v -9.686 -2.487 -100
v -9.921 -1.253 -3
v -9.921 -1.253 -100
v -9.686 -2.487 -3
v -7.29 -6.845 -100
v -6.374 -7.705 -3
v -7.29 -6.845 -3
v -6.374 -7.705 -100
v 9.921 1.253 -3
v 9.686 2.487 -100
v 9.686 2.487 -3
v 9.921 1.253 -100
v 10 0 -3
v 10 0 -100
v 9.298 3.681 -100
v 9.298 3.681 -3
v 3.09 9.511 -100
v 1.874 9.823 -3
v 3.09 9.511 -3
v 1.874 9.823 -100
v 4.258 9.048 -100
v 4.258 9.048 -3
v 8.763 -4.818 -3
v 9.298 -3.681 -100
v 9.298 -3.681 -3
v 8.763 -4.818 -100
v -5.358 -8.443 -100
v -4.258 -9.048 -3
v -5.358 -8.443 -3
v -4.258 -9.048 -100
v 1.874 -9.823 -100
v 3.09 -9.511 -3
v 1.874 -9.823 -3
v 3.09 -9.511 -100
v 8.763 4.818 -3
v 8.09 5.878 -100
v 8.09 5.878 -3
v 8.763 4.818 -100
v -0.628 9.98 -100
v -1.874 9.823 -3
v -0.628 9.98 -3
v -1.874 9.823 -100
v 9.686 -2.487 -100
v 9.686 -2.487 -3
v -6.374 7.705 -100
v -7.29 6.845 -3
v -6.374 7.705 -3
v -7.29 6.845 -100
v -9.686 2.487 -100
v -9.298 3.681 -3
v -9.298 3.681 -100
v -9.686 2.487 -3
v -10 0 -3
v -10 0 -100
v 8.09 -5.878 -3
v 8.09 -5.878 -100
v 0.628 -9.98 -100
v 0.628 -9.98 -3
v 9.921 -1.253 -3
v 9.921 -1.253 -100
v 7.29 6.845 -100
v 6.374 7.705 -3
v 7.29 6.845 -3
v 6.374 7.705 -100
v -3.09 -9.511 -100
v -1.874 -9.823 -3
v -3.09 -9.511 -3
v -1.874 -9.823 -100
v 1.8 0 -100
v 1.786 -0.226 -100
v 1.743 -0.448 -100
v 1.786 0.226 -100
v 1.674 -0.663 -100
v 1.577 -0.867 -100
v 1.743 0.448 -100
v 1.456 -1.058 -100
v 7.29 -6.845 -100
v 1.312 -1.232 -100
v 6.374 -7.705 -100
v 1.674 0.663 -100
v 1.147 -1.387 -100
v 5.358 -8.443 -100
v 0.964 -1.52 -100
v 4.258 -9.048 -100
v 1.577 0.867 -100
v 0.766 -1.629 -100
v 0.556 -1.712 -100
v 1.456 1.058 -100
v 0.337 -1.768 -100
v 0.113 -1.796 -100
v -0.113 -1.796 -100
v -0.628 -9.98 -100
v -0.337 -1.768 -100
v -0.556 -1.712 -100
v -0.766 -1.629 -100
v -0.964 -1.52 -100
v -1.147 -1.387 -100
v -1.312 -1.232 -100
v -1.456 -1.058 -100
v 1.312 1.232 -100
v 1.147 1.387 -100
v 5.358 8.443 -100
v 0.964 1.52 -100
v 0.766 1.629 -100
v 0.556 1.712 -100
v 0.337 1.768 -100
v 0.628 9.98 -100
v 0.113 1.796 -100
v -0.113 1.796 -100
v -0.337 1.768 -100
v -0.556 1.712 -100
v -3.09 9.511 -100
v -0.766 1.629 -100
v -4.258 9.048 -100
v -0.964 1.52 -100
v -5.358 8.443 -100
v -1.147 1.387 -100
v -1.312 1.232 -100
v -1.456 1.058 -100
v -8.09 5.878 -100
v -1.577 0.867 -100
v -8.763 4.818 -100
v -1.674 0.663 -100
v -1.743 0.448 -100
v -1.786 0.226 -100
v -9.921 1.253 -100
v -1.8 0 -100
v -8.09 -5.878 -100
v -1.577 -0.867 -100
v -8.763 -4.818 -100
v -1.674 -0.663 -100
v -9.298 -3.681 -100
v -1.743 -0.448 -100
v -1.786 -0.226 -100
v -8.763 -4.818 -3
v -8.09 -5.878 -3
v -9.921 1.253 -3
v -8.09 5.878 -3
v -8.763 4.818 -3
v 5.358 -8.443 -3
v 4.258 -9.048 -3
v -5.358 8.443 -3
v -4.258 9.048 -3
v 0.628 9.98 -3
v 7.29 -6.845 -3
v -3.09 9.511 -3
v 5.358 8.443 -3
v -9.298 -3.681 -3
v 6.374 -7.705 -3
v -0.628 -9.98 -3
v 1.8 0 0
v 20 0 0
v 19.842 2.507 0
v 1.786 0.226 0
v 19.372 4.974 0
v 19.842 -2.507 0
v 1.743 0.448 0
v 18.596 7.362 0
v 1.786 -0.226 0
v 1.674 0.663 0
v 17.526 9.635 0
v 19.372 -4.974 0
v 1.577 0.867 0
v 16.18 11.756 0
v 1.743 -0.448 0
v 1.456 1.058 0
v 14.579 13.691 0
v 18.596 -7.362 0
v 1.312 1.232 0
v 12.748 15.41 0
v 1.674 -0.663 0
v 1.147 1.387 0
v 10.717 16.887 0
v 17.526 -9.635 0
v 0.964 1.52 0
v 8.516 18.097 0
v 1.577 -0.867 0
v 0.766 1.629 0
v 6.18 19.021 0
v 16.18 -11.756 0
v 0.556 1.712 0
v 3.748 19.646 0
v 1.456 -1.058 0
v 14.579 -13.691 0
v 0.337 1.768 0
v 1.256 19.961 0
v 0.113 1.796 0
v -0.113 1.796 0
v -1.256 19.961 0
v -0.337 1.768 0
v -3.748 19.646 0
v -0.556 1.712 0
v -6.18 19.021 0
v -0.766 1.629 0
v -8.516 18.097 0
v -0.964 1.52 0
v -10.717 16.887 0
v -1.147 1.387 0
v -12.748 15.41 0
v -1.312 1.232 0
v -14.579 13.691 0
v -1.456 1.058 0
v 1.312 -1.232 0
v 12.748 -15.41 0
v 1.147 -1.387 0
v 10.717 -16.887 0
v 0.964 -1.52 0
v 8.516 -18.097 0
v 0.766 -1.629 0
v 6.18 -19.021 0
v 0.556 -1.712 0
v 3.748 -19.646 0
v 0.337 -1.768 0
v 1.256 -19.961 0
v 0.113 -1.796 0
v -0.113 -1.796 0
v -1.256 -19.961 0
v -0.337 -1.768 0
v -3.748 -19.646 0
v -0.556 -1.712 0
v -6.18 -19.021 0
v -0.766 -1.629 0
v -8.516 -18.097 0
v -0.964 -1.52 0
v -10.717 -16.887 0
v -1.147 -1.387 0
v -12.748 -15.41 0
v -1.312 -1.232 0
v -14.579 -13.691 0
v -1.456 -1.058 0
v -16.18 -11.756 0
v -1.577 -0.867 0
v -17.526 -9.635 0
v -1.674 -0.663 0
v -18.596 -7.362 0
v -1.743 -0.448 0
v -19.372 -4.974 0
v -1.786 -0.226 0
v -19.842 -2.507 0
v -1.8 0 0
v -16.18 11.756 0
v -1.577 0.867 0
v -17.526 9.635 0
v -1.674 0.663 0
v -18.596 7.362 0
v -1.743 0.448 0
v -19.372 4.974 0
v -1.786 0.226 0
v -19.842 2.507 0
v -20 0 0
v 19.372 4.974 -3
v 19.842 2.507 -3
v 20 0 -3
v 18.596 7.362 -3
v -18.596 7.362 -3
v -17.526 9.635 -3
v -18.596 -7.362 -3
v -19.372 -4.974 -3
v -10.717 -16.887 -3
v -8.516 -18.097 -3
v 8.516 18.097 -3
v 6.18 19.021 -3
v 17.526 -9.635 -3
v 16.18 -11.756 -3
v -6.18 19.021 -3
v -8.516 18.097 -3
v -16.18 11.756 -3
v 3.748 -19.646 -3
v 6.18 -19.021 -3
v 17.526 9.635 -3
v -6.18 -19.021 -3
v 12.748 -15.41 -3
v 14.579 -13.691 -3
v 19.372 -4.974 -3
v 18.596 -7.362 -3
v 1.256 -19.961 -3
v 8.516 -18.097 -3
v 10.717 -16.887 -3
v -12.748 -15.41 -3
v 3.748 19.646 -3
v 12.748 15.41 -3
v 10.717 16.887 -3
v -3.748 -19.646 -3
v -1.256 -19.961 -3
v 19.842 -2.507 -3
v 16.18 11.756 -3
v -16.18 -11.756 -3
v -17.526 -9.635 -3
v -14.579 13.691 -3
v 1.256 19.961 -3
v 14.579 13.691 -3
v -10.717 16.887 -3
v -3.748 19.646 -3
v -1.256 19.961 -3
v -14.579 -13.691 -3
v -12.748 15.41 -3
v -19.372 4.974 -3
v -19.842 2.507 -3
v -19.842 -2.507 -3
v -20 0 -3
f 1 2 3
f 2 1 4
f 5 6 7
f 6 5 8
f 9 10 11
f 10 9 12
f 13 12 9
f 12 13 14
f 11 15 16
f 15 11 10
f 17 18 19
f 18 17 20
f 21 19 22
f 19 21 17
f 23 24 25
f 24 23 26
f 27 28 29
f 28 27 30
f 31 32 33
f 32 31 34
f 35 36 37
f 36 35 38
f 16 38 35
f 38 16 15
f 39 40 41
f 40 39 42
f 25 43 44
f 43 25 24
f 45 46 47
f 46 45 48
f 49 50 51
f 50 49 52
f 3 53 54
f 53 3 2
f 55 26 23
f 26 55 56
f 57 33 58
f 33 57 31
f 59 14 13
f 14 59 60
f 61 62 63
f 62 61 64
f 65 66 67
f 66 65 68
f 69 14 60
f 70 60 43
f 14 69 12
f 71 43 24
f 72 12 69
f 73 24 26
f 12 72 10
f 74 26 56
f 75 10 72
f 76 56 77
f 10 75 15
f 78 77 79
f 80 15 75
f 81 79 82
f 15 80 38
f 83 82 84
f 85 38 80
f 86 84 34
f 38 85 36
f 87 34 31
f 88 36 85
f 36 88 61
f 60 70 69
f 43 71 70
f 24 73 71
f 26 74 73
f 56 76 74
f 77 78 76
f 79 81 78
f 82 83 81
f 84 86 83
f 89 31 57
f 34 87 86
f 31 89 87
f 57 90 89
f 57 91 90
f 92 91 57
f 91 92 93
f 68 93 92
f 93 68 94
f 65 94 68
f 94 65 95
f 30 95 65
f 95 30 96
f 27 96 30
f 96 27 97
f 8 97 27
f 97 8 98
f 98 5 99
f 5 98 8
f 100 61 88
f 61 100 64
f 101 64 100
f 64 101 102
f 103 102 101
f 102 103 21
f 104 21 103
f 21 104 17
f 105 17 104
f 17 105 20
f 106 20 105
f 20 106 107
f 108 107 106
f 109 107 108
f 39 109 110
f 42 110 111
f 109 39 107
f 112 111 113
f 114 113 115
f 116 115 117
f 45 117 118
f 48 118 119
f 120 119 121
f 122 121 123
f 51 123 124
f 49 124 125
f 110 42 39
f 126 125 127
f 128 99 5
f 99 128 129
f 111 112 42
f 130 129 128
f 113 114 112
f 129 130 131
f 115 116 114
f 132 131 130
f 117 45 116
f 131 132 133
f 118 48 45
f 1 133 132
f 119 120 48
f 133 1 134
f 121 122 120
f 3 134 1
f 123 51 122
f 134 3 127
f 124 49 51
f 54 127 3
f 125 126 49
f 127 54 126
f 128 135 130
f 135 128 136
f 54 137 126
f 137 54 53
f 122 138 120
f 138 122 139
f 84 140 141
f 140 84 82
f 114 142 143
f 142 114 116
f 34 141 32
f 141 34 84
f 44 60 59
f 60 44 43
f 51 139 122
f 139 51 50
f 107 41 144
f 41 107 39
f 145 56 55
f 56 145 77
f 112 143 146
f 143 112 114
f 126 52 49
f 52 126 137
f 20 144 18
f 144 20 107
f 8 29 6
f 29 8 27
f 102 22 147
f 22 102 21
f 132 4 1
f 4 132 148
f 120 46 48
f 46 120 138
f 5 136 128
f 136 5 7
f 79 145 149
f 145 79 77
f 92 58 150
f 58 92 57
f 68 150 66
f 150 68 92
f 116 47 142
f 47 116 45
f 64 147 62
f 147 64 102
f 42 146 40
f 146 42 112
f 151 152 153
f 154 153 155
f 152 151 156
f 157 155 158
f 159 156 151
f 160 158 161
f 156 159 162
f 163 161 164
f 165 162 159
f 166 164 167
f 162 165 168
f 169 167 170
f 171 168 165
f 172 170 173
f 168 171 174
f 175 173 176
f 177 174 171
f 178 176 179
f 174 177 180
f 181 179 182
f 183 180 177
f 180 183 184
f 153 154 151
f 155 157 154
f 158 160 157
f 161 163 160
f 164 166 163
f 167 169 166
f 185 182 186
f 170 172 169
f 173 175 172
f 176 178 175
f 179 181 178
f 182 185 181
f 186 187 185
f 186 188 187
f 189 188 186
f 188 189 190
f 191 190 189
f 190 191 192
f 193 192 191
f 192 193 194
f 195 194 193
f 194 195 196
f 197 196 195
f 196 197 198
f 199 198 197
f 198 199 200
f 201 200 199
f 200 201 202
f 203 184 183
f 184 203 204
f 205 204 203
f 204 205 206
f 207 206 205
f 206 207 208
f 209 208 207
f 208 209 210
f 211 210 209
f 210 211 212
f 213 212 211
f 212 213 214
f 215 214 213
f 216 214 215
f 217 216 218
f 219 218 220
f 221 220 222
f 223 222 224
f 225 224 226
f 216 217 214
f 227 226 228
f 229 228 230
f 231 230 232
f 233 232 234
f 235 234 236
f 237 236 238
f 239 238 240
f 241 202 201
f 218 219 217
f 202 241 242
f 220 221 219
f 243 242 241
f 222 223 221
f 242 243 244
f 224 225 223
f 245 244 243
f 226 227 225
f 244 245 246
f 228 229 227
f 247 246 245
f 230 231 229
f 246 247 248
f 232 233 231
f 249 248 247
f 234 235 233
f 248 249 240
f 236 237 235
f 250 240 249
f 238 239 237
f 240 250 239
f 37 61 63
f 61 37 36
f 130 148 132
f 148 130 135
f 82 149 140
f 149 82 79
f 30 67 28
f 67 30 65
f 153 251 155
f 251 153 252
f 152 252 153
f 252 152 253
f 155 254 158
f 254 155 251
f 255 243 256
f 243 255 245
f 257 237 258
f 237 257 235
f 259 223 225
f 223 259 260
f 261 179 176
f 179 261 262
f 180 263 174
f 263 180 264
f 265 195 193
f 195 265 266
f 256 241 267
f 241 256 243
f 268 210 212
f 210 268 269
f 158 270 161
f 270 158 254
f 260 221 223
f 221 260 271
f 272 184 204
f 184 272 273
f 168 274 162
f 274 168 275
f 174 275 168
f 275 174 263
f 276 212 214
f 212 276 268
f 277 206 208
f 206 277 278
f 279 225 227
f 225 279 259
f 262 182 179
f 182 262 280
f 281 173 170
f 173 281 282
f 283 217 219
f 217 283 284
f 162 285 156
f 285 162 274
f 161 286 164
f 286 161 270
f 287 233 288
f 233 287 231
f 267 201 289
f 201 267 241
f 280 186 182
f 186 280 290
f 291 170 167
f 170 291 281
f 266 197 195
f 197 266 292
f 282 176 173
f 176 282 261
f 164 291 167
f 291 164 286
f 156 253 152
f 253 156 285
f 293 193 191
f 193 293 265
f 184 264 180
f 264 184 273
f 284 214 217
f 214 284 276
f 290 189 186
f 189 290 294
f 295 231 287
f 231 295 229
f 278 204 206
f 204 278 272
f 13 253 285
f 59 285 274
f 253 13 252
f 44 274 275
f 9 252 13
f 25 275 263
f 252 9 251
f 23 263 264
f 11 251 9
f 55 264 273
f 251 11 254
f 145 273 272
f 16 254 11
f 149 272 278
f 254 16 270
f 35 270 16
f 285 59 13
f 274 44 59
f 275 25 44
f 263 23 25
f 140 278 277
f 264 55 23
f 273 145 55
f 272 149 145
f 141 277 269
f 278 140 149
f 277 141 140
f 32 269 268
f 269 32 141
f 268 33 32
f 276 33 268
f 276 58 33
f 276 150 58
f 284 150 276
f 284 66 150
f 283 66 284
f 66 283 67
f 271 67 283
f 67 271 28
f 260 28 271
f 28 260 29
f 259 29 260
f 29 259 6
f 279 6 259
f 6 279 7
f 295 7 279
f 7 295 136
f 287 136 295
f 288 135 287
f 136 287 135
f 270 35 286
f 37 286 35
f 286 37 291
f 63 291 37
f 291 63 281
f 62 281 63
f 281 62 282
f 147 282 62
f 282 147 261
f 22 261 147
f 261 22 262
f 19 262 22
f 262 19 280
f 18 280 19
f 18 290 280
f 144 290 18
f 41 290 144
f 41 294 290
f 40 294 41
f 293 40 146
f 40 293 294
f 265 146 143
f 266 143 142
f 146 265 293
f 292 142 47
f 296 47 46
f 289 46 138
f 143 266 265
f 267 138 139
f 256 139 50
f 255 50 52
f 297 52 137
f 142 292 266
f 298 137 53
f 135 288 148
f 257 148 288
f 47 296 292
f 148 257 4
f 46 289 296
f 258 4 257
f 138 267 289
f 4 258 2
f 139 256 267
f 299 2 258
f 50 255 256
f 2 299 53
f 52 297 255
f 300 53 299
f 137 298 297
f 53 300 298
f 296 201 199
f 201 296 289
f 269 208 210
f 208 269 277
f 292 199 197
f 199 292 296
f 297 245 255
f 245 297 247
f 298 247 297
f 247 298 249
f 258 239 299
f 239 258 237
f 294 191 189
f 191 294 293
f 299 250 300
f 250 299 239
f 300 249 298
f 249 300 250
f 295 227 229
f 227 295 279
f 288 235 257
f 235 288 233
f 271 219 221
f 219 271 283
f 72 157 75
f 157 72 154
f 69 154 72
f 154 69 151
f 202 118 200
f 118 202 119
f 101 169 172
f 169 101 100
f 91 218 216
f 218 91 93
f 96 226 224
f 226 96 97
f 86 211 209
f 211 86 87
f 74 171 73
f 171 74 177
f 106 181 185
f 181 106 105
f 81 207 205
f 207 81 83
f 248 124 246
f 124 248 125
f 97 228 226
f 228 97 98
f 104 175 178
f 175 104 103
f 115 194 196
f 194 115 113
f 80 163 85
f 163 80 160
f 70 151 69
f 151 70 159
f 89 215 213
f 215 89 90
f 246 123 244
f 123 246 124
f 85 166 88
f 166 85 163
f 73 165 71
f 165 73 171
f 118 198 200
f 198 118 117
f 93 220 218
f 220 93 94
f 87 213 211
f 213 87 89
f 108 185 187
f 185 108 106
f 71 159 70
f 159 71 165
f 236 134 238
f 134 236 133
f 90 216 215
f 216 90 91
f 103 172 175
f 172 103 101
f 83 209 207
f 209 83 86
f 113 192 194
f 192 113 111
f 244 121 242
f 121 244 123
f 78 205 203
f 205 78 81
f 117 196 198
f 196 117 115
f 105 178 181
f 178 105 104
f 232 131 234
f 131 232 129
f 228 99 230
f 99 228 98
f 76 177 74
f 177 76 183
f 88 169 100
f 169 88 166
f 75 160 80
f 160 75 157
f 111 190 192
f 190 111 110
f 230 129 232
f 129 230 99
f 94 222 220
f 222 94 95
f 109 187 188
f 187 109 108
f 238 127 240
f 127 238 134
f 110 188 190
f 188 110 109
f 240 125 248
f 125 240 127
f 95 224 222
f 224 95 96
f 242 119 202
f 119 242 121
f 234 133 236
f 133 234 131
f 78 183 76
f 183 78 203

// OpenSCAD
$fn = 50;


difference() {
	union() {
		translate(v = [0, 0, -100.0000000000]) {
			cylinder(h = 100, r = 10.0000000000);
		}
		translate(v = [0, 0, -3.0000000000]) {
			cylinder(h = 3, r = 20.0000000000);
		}
	}
	union() {
		#translate(v = [0, 0, -100]) {
			cylinder(h = 100, r = 1.8000000000);
		}
	}
}
